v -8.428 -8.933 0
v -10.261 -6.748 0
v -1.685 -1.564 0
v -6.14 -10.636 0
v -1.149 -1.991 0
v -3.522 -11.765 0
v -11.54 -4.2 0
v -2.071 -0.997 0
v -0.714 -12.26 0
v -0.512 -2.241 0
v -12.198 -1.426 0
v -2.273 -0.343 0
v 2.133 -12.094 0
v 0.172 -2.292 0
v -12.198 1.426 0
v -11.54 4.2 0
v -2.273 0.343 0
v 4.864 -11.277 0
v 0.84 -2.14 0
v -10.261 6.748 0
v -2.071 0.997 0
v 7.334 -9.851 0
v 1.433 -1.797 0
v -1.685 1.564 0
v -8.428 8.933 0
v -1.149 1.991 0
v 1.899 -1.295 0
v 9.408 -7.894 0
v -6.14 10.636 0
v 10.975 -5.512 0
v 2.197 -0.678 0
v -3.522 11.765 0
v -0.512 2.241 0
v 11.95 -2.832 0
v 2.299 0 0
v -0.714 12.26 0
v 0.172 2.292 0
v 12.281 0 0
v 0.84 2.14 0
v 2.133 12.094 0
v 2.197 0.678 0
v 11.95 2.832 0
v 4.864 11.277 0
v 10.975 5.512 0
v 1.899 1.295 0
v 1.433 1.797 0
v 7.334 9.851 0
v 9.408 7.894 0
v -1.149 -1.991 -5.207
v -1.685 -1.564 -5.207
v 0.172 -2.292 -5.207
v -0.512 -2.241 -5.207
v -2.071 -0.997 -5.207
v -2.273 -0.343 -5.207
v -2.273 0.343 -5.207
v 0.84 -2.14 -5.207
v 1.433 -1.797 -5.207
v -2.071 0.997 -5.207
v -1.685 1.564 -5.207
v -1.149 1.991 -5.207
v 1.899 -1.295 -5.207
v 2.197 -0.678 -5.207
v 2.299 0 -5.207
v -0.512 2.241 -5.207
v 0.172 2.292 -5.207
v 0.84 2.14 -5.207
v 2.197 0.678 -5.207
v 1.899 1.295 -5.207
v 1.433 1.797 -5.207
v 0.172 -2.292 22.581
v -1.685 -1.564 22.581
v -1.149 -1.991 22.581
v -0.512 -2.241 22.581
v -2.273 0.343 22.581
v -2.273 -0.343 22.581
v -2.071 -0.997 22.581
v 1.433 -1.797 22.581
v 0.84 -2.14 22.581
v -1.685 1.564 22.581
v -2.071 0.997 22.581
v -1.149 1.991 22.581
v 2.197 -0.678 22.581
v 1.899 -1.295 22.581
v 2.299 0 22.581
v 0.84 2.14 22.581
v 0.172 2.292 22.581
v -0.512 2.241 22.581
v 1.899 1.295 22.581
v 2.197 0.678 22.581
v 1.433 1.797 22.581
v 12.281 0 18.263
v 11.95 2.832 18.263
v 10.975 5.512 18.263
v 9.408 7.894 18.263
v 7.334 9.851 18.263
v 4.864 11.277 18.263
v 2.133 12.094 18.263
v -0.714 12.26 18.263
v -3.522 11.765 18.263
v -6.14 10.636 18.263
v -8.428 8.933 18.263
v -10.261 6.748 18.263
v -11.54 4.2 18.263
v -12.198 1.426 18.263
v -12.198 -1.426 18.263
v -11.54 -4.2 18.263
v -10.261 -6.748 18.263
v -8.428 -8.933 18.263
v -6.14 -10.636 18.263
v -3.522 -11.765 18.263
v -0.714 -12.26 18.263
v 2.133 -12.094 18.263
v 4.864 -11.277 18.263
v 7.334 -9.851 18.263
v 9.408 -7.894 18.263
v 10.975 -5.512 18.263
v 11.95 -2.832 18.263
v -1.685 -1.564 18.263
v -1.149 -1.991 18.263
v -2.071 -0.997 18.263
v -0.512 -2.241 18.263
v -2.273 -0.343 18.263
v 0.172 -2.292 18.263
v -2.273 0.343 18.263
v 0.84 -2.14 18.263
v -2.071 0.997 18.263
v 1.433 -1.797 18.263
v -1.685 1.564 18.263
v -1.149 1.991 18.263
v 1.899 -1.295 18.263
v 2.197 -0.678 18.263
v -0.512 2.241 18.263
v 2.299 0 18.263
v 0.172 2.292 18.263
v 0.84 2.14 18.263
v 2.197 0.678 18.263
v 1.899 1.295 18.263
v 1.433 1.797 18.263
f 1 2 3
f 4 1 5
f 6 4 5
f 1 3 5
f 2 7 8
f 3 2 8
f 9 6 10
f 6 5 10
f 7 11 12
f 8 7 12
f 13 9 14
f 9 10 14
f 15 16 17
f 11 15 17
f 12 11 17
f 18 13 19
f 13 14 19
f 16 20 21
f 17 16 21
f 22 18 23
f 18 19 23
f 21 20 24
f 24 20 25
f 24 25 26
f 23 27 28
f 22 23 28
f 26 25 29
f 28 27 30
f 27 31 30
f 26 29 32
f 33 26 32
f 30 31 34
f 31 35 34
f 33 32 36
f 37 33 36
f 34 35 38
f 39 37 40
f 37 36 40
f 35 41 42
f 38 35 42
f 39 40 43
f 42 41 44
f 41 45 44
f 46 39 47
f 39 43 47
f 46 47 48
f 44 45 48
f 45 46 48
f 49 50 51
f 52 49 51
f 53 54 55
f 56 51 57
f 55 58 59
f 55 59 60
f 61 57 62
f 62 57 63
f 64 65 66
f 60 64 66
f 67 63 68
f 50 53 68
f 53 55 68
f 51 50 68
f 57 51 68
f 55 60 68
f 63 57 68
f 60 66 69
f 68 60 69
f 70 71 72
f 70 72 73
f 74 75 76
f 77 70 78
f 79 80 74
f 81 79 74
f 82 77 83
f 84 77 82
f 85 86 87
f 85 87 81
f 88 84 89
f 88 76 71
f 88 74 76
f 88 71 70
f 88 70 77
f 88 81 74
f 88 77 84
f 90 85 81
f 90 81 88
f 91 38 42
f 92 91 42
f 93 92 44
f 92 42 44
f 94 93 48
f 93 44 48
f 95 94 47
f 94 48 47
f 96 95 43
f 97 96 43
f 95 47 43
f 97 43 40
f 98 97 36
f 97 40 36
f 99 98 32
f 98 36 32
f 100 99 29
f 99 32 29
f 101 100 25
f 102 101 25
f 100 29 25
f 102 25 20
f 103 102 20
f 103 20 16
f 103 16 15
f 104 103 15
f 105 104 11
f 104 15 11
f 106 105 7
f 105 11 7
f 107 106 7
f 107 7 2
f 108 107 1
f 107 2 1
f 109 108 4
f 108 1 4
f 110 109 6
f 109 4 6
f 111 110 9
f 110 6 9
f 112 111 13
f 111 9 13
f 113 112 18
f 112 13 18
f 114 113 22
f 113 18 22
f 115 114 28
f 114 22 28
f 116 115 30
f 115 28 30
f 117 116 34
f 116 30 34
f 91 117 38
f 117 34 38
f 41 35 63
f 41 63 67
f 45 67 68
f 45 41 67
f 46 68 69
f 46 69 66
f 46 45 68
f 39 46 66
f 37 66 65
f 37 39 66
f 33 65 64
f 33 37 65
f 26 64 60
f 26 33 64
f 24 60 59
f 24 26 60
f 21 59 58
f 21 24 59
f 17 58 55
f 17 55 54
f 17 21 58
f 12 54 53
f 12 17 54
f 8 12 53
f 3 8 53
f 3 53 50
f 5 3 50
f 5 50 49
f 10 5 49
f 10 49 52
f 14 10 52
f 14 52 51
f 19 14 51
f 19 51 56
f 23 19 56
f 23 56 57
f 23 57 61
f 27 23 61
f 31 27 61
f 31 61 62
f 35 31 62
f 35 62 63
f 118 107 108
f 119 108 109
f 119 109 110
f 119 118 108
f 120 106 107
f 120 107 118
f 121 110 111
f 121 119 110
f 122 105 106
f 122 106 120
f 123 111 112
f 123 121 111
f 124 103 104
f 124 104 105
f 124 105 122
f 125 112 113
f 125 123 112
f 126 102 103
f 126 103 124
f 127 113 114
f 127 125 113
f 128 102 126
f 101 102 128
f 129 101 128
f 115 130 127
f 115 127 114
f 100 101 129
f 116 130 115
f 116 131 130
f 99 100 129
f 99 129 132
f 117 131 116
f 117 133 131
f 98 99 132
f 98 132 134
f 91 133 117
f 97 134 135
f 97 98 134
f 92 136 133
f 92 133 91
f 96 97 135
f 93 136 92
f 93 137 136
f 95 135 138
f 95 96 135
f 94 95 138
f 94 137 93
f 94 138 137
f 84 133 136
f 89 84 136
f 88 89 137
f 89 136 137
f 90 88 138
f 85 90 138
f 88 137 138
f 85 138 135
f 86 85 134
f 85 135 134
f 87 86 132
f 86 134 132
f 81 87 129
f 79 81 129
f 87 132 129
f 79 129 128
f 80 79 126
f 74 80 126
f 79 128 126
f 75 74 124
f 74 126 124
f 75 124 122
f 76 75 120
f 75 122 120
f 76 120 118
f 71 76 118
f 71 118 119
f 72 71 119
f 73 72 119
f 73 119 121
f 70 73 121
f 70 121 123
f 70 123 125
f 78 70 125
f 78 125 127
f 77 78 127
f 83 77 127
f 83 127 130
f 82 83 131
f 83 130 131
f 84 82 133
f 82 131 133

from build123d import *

# Parameters (mm, degrees)
F0_R      = 12.2809
F1_DEPTH  = 18.2626
F2_R      = 2.2987
F3_DEPTH  = 4.318
F3_FACE_R = 2.2987
F4_DEPTH  = 27.7876


with BuildPart() as f1:
    # F0 (on Top) → F1 (new body)
    with BuildSketch(Plane.XY):
        Circle(F0_R)
    extrude(amount=F1_DEPTH)

    # F2 (on face) → F3 (join)
    with BuildSketch(Plane.XY.offset(18.2626)):
        Circle(F2_R)
    extrude(amount=F3_DEPTH)

    # F3_face (on face) → F4 (join)
    with BuildSketch(Plane.XY.offset(22.5806)):
        Circle(F3_FACE_R)
    extrude(amount=-F4_DEPTH)


solid = f1.part
